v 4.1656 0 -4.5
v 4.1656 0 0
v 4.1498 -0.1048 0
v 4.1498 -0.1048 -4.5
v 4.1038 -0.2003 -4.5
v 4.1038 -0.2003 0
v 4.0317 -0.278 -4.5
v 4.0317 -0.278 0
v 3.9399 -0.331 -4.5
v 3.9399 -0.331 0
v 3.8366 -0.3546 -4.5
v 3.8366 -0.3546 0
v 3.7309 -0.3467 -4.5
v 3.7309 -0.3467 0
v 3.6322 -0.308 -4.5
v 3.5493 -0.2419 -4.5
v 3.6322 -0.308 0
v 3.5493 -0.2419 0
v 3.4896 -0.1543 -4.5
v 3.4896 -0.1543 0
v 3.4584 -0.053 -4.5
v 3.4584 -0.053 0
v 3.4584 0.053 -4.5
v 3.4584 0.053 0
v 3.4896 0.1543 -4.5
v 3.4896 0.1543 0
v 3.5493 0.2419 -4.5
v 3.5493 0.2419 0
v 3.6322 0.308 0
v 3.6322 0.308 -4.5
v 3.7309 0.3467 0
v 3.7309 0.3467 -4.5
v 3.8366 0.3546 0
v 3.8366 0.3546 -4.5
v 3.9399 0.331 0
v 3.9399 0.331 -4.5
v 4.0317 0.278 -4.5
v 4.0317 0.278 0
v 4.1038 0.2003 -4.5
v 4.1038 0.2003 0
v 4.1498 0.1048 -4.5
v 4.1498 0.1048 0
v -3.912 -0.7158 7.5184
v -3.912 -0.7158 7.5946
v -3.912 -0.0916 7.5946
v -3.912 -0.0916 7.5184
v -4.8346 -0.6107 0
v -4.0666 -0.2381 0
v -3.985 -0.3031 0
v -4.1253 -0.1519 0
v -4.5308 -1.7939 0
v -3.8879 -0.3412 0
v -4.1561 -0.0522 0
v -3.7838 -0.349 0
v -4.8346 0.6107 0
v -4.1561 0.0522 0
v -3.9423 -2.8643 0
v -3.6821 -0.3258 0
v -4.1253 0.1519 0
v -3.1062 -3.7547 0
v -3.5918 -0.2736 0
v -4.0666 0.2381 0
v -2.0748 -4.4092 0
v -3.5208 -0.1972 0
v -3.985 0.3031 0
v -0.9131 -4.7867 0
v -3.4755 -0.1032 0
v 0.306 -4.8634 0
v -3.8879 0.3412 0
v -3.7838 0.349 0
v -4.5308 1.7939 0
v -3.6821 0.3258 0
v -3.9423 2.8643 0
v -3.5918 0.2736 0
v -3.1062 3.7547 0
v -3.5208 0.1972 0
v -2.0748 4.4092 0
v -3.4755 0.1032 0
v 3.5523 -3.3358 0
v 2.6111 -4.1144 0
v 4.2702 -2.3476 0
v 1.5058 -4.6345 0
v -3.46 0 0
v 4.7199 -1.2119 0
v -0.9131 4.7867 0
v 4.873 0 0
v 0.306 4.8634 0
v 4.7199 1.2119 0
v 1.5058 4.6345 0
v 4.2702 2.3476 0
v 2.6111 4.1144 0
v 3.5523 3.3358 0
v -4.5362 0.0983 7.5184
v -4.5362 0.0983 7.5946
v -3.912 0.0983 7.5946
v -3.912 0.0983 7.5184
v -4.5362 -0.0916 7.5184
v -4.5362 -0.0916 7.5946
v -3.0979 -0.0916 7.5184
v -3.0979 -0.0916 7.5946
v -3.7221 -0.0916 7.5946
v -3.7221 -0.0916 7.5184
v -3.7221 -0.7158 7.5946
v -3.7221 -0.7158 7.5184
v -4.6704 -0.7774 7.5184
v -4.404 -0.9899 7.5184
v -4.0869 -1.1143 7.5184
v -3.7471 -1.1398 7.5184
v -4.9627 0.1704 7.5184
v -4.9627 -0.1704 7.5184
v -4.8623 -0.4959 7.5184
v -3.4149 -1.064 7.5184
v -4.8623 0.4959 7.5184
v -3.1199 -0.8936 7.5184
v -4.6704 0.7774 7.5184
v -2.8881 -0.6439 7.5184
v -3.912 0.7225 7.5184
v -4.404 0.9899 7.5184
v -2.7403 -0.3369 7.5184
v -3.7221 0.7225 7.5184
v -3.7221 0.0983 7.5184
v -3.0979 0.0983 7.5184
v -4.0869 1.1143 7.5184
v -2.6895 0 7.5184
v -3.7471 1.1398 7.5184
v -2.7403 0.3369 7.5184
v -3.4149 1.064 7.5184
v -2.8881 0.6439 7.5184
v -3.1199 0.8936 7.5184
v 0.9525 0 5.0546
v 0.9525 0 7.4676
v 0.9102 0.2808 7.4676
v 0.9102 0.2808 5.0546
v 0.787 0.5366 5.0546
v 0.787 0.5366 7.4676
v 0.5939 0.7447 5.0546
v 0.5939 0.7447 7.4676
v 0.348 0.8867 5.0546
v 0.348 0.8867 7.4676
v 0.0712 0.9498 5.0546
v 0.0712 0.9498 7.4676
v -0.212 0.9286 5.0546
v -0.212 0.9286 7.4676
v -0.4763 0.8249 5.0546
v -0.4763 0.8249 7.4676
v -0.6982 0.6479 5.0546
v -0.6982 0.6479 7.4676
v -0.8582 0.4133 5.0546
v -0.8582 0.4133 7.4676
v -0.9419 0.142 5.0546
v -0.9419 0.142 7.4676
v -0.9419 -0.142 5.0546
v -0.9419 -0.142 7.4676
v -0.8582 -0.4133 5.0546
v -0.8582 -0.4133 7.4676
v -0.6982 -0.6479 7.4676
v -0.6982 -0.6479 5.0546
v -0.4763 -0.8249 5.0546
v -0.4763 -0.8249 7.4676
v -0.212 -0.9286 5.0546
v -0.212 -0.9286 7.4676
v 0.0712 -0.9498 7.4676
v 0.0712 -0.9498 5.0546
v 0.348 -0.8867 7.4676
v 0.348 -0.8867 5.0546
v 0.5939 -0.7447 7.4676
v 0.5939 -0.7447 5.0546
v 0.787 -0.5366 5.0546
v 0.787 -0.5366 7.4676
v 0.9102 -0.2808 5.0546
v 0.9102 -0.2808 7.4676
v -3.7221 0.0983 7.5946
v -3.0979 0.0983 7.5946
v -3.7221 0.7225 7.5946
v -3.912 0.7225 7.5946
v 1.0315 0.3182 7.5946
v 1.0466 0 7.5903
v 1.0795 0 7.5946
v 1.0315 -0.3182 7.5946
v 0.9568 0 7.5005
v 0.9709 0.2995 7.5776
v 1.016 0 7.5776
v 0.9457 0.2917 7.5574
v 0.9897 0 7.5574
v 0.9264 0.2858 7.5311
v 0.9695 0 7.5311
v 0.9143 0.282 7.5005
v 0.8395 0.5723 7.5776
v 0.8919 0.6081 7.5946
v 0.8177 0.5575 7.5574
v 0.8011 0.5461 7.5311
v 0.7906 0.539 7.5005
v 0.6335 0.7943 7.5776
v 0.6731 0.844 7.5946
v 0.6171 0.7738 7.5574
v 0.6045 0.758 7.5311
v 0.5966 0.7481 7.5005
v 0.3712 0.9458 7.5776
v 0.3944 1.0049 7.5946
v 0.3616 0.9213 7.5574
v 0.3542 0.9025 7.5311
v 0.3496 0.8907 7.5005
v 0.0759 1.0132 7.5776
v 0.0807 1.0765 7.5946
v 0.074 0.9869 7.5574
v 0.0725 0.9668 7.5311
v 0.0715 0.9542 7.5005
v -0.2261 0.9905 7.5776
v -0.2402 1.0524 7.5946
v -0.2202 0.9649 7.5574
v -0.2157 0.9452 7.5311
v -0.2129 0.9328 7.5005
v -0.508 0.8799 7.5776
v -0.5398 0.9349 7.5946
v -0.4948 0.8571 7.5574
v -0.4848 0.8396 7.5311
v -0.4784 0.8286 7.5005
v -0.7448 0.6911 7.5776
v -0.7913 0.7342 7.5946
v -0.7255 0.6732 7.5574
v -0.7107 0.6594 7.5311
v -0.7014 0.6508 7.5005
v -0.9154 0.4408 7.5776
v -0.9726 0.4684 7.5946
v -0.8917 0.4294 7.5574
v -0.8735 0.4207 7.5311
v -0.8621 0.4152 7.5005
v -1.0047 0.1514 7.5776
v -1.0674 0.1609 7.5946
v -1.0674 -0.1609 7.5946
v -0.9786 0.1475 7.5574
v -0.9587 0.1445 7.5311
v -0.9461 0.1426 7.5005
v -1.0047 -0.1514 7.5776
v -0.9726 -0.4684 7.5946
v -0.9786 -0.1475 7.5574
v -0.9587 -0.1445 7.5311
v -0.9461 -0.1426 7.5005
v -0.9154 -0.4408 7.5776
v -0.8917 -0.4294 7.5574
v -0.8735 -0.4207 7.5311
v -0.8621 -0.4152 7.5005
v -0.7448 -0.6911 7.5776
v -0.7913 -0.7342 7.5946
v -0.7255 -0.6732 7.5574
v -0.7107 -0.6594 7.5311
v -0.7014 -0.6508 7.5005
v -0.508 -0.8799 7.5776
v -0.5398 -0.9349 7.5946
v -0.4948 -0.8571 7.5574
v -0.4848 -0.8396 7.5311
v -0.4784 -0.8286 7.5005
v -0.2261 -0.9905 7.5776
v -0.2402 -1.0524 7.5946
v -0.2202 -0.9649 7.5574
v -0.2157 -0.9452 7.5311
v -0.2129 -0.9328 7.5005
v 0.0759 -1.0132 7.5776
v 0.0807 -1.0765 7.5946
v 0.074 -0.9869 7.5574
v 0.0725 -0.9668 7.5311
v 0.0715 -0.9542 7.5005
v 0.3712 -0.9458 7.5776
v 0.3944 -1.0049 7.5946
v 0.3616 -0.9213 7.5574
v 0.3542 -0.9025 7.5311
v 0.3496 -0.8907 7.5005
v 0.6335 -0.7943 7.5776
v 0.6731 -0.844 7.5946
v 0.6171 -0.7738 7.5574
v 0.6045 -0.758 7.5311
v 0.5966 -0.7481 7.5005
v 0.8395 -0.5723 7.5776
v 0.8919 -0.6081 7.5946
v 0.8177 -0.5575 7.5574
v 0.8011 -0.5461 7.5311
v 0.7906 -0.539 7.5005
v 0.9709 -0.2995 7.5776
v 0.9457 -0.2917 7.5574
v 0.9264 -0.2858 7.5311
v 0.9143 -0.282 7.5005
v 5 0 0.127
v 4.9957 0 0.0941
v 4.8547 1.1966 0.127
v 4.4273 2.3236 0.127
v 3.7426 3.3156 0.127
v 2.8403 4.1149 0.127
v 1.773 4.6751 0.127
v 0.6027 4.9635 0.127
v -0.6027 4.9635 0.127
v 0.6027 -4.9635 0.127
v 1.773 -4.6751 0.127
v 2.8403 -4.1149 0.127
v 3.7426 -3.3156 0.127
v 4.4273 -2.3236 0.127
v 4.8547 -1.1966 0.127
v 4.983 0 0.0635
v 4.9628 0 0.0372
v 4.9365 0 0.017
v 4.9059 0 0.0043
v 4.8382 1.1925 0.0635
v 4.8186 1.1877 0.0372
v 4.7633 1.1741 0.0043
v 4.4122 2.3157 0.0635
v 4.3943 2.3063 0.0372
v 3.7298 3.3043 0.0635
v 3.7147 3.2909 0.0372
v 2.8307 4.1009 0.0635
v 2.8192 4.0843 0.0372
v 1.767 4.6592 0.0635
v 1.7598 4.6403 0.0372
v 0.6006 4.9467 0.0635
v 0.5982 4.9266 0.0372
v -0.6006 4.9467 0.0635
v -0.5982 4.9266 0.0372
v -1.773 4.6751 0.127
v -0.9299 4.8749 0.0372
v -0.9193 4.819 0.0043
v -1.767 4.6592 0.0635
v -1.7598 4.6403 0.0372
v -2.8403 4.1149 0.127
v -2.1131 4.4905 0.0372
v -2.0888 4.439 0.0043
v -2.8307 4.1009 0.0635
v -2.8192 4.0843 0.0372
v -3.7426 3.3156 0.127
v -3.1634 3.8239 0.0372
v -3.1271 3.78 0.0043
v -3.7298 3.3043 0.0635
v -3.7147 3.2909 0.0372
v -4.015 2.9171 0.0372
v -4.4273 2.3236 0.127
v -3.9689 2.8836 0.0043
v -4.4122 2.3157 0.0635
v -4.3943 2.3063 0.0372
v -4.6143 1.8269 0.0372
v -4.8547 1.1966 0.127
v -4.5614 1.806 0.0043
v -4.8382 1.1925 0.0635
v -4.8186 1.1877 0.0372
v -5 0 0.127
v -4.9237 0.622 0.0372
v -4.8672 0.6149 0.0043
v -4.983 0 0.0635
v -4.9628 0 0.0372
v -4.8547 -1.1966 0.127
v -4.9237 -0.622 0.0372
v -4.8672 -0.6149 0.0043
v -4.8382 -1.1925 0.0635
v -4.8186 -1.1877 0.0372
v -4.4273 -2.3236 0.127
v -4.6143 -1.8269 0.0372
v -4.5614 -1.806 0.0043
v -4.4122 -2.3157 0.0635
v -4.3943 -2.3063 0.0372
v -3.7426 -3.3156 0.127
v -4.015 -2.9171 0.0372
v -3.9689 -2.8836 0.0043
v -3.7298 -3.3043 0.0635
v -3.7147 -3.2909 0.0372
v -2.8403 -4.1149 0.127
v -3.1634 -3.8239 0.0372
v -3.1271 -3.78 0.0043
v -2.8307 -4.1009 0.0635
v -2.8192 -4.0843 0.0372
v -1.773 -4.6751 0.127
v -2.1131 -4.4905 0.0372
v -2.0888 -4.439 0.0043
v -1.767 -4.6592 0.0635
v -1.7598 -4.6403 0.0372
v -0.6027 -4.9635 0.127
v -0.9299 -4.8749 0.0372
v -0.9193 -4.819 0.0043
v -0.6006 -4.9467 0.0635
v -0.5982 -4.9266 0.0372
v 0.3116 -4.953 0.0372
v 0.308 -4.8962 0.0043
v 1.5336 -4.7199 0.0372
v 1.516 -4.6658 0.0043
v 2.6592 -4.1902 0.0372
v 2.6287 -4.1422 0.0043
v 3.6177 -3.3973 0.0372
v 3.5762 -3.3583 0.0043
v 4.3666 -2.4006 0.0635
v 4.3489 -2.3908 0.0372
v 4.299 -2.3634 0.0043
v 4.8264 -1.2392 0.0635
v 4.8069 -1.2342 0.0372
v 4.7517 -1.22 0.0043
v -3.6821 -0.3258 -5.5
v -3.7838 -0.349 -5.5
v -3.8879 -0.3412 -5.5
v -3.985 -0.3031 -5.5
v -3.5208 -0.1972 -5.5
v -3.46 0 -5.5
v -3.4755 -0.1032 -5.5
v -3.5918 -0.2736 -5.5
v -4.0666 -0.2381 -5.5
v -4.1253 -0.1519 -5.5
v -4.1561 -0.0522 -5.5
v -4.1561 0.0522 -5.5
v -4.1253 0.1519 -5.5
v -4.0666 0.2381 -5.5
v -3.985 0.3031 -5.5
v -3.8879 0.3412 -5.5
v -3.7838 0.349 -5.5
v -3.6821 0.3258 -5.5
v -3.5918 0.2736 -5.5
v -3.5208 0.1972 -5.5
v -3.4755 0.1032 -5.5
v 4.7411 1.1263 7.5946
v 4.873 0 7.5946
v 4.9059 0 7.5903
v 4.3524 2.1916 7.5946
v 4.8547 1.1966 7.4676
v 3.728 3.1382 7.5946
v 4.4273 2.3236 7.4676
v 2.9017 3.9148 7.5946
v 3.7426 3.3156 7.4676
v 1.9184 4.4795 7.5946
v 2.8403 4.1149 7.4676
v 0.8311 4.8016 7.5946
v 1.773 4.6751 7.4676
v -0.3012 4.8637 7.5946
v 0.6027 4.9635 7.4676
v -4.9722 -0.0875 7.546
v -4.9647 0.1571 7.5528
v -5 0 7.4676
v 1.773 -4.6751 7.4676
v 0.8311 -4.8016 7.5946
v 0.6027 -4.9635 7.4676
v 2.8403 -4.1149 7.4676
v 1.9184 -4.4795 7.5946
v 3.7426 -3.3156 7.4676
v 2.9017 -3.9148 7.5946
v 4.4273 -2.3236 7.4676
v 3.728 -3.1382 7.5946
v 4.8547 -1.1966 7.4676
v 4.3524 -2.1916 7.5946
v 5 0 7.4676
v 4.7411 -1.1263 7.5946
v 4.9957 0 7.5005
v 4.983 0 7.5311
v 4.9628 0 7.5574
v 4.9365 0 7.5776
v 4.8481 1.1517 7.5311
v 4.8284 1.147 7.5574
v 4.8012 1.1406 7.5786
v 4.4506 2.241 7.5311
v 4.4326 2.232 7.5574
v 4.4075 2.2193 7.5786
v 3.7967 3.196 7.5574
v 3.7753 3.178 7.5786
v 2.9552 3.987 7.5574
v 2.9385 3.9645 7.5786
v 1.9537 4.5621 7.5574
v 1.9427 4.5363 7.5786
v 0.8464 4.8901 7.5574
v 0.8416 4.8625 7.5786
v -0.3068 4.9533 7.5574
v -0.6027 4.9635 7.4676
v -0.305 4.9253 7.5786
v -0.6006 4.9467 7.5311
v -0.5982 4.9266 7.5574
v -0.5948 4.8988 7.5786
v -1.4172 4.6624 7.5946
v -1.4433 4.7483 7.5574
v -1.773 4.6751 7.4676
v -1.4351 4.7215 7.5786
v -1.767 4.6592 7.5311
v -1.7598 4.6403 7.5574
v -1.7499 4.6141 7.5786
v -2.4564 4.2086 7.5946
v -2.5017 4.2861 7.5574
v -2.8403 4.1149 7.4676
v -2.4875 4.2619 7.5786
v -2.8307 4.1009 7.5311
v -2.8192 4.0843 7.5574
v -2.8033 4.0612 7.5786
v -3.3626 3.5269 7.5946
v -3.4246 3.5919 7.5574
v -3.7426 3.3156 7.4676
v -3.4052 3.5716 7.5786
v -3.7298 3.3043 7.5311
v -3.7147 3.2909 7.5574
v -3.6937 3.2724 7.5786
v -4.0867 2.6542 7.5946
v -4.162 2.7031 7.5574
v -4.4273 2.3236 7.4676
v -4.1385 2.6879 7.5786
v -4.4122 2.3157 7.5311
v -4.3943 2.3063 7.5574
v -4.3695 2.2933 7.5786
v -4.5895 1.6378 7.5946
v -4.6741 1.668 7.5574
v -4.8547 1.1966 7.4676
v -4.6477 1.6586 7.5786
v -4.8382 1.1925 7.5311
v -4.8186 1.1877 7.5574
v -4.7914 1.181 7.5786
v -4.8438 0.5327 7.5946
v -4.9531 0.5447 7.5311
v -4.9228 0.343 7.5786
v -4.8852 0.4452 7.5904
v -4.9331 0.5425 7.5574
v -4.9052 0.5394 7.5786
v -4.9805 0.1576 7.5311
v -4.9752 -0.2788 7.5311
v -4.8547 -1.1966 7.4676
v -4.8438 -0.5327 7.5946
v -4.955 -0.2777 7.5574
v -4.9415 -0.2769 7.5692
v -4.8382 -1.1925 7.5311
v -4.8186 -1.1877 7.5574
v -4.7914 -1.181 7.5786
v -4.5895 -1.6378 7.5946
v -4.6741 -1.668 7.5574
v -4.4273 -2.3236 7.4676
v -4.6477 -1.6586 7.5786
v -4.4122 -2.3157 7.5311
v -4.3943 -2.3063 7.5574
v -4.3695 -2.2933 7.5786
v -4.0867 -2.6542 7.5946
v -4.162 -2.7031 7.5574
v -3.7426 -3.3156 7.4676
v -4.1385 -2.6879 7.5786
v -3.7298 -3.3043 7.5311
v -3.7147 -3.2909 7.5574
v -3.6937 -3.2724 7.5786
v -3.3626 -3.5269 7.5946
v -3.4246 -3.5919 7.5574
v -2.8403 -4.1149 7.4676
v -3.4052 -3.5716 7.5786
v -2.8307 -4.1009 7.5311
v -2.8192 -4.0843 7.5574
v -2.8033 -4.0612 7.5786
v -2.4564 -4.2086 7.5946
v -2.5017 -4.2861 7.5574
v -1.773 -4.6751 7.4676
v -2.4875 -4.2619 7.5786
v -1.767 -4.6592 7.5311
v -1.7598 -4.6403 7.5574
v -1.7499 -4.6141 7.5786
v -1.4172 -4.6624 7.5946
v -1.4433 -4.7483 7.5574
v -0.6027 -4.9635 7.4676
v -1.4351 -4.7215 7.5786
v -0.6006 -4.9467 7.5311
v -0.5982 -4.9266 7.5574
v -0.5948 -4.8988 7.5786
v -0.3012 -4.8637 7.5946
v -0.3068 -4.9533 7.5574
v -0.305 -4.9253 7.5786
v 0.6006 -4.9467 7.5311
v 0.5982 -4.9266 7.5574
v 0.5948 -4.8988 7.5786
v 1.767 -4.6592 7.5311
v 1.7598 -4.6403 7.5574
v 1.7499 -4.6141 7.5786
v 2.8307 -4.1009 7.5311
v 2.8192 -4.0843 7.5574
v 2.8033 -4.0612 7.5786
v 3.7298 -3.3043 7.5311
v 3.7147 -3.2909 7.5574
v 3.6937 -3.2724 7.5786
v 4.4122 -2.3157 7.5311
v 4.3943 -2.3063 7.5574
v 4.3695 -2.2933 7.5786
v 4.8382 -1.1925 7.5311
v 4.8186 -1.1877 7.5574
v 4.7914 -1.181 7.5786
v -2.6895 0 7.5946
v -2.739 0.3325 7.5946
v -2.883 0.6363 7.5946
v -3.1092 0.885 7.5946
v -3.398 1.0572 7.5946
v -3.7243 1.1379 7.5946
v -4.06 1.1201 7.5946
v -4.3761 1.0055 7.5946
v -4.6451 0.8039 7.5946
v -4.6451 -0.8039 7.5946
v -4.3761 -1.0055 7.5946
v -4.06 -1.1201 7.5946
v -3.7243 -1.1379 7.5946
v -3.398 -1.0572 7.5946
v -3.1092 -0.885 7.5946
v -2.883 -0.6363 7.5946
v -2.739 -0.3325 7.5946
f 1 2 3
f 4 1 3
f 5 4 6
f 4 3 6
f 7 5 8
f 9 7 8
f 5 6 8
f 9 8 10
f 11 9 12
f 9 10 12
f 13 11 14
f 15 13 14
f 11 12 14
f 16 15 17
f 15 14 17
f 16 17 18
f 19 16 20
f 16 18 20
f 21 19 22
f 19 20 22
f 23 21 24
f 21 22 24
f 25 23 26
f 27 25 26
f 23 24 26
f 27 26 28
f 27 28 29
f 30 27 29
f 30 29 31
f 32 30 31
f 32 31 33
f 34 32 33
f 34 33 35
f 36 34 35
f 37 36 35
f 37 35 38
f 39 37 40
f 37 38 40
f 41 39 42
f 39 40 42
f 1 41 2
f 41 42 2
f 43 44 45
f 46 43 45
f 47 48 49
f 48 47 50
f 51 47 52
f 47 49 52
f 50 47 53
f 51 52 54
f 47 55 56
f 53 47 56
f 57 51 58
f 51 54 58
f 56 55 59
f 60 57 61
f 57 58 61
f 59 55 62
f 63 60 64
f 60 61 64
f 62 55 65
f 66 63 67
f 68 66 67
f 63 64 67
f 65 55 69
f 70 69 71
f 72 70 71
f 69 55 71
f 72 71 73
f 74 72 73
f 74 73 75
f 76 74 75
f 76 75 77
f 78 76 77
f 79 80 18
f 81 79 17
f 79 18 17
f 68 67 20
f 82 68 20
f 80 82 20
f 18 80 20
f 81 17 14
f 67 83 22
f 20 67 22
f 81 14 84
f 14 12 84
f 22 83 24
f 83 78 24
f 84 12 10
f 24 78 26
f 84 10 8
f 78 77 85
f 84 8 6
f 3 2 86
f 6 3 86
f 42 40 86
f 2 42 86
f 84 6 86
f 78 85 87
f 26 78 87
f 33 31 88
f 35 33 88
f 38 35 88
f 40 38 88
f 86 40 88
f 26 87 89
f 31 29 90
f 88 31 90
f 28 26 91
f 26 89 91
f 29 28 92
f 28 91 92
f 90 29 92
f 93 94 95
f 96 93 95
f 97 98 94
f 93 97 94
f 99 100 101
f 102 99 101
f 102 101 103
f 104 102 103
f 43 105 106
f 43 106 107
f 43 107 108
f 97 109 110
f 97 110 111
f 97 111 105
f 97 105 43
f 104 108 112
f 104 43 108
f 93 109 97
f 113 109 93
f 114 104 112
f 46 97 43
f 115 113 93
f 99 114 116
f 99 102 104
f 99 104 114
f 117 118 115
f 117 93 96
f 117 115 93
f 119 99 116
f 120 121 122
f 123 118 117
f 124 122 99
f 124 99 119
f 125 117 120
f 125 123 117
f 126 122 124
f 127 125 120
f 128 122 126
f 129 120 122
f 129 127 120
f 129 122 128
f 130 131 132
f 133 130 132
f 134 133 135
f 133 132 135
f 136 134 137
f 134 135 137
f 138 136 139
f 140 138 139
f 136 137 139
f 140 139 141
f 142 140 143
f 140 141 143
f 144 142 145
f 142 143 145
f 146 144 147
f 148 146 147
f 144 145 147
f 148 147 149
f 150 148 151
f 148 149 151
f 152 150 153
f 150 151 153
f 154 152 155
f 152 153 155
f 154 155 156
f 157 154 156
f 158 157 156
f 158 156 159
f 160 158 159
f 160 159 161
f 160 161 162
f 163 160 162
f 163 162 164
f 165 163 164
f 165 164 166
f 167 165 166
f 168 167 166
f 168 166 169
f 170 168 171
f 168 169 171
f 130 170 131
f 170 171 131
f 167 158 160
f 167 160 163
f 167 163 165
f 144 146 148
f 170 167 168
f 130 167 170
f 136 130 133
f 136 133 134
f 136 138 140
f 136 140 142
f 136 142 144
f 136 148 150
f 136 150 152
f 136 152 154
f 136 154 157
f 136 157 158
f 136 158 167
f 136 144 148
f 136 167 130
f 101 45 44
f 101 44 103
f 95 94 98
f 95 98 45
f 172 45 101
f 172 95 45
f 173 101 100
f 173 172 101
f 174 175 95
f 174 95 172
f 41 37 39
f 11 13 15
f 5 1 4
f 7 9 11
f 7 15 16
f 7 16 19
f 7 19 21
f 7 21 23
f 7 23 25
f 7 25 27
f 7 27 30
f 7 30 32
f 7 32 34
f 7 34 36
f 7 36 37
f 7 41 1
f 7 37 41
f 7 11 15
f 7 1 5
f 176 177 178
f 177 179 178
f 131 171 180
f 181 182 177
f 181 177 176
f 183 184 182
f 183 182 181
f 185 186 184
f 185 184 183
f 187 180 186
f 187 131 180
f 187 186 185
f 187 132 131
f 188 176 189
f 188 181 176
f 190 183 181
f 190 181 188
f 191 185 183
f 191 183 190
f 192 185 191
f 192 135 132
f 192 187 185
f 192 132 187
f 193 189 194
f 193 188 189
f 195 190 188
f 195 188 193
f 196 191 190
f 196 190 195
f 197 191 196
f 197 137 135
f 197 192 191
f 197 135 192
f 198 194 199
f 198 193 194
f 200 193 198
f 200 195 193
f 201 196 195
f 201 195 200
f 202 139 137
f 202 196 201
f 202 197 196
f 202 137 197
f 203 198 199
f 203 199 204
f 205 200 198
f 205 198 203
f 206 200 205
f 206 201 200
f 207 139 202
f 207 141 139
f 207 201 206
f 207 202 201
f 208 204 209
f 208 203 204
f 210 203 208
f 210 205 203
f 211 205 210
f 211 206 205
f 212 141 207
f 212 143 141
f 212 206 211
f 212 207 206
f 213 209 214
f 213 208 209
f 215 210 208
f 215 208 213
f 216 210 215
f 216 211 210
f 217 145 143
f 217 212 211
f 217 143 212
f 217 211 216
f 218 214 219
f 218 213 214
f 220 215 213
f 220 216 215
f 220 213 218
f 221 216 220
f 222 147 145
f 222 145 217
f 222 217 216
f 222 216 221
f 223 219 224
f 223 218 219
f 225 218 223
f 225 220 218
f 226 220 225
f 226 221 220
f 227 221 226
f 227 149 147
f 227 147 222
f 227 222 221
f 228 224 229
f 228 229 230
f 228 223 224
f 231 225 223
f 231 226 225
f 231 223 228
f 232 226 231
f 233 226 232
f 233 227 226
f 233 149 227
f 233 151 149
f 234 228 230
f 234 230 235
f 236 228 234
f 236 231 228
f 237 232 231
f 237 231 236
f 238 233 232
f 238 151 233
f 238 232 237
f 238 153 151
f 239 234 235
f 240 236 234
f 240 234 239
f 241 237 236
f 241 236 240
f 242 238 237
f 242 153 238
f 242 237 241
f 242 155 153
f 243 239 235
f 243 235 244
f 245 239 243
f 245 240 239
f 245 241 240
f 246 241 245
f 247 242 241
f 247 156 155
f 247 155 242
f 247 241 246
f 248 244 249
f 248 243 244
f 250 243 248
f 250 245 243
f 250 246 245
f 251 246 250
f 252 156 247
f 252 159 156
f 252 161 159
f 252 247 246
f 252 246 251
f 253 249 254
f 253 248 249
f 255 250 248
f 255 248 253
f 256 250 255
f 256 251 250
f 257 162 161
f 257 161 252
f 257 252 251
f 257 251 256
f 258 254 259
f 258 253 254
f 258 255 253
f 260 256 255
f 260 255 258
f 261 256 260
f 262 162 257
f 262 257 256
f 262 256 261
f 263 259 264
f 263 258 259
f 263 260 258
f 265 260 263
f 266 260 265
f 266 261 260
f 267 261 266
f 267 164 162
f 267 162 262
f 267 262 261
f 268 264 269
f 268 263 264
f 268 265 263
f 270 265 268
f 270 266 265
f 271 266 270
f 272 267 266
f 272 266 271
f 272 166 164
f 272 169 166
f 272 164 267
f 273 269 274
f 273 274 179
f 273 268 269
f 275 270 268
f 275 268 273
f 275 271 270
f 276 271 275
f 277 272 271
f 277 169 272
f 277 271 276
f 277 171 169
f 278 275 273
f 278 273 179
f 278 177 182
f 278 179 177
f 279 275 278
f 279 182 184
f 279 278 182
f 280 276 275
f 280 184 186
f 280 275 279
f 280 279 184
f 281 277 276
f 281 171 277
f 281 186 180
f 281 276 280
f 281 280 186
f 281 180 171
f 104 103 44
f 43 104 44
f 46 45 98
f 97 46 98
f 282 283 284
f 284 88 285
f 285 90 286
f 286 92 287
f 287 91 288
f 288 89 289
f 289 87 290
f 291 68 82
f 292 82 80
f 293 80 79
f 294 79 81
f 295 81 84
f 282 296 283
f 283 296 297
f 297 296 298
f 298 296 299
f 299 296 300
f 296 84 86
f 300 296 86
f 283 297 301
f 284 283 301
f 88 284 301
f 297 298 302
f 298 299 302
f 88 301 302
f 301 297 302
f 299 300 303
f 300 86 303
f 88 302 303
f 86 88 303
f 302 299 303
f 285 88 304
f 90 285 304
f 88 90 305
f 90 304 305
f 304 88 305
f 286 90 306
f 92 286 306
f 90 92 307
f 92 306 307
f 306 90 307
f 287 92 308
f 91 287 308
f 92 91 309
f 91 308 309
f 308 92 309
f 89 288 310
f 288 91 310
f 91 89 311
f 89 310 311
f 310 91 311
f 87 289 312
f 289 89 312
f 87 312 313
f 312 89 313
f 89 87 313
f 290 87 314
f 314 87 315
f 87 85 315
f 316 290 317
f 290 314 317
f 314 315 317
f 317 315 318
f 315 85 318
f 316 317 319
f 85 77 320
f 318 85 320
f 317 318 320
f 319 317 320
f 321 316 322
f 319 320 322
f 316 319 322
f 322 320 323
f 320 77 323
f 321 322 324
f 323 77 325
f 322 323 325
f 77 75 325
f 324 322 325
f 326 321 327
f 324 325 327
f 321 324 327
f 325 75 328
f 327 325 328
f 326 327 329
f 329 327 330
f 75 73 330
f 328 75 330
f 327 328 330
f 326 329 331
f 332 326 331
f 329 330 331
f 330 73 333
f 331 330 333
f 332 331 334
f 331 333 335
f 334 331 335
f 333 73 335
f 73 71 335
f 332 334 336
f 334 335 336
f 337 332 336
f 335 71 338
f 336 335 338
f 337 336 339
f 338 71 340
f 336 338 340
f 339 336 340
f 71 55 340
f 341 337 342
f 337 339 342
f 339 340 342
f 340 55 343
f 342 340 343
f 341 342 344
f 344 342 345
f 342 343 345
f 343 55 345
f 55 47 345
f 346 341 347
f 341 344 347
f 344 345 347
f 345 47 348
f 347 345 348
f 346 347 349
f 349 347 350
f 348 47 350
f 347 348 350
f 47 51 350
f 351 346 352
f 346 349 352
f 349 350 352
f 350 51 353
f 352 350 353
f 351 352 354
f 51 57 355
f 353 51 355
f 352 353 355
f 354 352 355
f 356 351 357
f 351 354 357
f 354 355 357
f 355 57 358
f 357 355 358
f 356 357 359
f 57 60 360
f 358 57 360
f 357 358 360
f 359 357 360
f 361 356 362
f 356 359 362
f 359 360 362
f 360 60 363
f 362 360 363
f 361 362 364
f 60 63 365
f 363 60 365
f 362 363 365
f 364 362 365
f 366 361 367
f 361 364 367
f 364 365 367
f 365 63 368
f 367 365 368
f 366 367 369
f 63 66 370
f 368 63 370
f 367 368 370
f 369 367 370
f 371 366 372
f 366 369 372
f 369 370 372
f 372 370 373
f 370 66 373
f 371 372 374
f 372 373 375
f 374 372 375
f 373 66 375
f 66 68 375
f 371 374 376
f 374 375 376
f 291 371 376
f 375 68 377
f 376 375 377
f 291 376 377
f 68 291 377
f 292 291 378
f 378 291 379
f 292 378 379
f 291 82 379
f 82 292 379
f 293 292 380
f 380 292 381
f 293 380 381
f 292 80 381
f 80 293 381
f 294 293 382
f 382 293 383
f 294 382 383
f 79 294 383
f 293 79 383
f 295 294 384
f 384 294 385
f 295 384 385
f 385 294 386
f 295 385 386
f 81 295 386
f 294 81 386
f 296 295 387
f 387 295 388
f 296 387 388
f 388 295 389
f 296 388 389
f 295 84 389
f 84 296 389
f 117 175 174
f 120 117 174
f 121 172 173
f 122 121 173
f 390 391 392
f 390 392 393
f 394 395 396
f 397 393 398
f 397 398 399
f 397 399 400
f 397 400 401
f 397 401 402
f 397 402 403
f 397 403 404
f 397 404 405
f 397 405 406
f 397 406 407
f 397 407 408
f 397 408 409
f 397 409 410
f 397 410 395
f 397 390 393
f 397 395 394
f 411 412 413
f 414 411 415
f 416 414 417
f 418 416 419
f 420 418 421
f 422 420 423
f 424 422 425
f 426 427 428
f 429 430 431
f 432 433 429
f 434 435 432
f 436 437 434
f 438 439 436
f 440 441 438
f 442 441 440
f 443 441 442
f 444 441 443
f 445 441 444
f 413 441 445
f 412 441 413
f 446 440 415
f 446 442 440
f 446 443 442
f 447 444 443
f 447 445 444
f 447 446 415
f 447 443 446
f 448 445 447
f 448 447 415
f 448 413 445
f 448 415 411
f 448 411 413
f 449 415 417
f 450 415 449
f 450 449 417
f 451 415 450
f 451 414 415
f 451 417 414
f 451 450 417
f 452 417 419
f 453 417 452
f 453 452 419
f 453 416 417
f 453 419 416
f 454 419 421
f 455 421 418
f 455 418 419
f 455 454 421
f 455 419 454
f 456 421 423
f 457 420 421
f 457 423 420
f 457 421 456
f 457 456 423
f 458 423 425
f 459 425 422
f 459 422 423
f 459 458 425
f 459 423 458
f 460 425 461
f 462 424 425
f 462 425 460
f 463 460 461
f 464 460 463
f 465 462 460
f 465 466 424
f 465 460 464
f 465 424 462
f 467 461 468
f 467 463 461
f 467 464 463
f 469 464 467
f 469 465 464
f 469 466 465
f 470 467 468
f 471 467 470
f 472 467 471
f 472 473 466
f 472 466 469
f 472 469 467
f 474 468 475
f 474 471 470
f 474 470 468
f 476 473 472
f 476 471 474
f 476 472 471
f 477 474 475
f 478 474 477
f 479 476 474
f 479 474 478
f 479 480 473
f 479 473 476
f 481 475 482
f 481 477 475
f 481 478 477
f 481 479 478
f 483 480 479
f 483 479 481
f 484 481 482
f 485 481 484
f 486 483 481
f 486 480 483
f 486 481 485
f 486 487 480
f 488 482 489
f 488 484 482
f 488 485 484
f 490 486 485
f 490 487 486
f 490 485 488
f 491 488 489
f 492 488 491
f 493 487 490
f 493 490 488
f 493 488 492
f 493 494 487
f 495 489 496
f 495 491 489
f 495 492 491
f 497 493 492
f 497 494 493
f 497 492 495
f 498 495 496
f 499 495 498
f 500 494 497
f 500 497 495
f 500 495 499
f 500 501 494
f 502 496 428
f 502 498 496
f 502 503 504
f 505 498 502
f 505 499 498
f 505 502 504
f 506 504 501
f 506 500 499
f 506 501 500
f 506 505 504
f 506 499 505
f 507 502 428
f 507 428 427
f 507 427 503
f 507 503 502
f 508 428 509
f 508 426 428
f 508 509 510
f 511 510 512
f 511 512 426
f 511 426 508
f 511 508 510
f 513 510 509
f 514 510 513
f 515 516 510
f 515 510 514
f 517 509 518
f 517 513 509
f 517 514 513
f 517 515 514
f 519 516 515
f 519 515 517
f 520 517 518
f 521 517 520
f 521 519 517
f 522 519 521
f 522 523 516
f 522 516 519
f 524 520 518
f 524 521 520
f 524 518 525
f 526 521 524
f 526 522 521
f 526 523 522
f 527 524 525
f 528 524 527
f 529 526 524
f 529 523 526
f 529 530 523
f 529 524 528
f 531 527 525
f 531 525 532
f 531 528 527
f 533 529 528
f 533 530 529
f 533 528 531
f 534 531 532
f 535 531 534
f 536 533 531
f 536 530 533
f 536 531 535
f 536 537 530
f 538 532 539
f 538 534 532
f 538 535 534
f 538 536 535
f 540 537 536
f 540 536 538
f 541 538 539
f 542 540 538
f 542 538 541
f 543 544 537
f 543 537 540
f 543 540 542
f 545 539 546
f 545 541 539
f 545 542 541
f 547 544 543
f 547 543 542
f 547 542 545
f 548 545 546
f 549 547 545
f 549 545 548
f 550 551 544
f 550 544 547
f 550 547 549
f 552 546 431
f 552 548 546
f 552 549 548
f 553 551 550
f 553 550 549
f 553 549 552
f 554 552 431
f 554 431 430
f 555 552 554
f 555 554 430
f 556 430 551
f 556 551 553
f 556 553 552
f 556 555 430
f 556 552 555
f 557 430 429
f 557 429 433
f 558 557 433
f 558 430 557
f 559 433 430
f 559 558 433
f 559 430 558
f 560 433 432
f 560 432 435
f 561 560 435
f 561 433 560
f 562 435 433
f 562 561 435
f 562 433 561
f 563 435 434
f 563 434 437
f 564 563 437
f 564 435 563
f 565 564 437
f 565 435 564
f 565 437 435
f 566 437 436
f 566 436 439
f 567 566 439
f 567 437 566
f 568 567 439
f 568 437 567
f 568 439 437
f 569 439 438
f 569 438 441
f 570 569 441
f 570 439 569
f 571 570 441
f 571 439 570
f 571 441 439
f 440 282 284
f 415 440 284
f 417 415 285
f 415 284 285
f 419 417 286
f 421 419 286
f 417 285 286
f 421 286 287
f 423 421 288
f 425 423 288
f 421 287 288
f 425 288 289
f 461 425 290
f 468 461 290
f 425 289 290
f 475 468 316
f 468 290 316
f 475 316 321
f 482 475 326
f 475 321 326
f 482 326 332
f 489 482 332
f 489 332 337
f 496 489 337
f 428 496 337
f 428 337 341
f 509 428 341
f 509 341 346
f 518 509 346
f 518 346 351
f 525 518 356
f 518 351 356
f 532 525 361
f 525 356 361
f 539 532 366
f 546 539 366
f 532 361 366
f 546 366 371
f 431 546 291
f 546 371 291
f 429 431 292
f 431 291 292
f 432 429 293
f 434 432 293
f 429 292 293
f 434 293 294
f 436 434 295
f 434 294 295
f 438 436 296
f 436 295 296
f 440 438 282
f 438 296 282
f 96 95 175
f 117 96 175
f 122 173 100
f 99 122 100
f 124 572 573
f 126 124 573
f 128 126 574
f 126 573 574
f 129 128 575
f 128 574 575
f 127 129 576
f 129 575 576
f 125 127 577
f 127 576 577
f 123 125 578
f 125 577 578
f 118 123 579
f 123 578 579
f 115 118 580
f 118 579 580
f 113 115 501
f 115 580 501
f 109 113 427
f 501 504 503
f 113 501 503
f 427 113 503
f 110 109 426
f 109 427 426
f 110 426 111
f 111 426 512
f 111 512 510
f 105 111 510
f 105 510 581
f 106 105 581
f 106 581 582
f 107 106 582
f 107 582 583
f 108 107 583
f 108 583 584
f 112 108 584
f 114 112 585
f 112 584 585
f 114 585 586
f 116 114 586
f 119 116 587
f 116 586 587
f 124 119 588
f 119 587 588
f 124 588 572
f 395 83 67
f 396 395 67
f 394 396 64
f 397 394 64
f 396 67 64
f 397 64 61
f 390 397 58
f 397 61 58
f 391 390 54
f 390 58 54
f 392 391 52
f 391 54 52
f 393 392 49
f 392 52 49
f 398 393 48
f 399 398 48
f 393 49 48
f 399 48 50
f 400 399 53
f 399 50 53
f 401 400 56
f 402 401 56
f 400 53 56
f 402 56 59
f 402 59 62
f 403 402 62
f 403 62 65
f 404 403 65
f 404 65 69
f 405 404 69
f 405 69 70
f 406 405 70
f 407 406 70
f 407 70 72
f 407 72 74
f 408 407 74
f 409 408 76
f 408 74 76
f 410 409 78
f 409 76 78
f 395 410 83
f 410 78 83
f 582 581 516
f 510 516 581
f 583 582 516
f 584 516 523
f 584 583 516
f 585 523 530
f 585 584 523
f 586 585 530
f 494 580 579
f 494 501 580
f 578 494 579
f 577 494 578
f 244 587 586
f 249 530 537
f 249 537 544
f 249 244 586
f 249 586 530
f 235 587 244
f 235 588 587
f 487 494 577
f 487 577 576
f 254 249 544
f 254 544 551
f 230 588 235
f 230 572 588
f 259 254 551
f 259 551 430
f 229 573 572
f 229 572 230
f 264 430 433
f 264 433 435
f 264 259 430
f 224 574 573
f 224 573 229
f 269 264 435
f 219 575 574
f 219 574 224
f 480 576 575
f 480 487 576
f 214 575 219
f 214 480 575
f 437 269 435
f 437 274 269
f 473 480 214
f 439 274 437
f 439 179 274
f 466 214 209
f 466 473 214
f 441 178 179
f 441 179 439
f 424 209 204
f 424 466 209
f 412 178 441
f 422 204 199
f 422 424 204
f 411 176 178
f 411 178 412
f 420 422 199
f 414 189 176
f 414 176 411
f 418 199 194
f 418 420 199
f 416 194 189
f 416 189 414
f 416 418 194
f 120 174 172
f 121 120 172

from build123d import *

# Parameters (mm, degrees)
SKETCH2_R           = 5
BOSS_EXTRUDE1_DEPTH = 7.5946
SKETCH3_R           = 0.9525
CUT_EXTRUDE1_DEPTH  = 2.54
FILLET1_R           = 0.127
SKETCH4_R           = 0.35
BOSS_EXTRUDE2_DEPTH = 5.5
SKETCH7_R           = 0.3556
BOSS_EXTRUDE3_DEPTH = 4.5
SKETCH6_R           = 1.143
CUT_EXTRUDE3_DEPTH  = 0.0762


with BuildPart() as part:
    # Sketch2 → Boss-Extrude1 (new body)
    with BuildSketch(Plane.XY):
        Circle(SKETCH2_R)
    extrude(amount=BOSS_EXTRUDE1_DEPTH)

    # Sketch3 → Cut-Extrude1 (cut)
    with BuildSketch(Plane.XY.offset(7.5946)):
        Circle(SKETCH3_R)
    extrude(amount=-CUT_EXTRUDE1_DEPTH, mode=Mode.SUBTRACT)

    # Fillet1
    fillet1_edges = [part.edges().sort_by_distance(p)[0] for p in [
        (-0.9525, 0, 7.5946),
        (-5, 0, 0),
        (-5, 0, 7.5946),
    ]]
    fillet(fillet1_edges, radius=FILLET1_R)

    # Sketch4 → Boss-Extrude2 (add)
    with BuildSketch(Plane(origin=(0, 0, 0), x_dir=(-1, 0, 0), z_dir=(0, 0, -1))):
        with Locations((3.81, 0)):
            Circle(SKETCH4_R)
    extrude(amount=BOSS_EXTRUDE2_DEPTH)

    # Sketch7 → Boss-Extrude3 (add)
    with BuildSketch(Plane(origin=(0, 0, 0), x_dir=(-1, 0, 0), z_dir=(0, 0, -1))):
        with Locations((-3.81, 0)):
            Circle(SKETCH7_R)
    extrude(amount=BOSS_EXTRUDE3_DEPTH)

    # Sketch6 → Cut-Extrude3 (cut)
    with BuildSketch(Plane.XY.offset(7.5946)):
        with Locations((-3.832516077, 0)):
            Circle(SKETCH6_R)
        Polygon((-3.912034188, 0.09834359), (-3.912034188, 0.722488889), (-3.722076923, 0.722488889), (-3.722076923, 0.09834359), (-3.097931624, 0.09834359), (-3.097931624, -0.091613675), (-3.722076923, -0.091613675), (-3.722076923, -0.715758974), (-3.912034188, -0.715758974), (-3.912034188, -0.091613675), (-4.536179487, -0.091613675), (-4.536179487, 0.09834359), align=None, mode=Mode.SUBTRACT)
    extrude(amount=-CUT_EXTRUDE3_DEPTH, mode=Mode.SUBTRACT)


solid = part.part
